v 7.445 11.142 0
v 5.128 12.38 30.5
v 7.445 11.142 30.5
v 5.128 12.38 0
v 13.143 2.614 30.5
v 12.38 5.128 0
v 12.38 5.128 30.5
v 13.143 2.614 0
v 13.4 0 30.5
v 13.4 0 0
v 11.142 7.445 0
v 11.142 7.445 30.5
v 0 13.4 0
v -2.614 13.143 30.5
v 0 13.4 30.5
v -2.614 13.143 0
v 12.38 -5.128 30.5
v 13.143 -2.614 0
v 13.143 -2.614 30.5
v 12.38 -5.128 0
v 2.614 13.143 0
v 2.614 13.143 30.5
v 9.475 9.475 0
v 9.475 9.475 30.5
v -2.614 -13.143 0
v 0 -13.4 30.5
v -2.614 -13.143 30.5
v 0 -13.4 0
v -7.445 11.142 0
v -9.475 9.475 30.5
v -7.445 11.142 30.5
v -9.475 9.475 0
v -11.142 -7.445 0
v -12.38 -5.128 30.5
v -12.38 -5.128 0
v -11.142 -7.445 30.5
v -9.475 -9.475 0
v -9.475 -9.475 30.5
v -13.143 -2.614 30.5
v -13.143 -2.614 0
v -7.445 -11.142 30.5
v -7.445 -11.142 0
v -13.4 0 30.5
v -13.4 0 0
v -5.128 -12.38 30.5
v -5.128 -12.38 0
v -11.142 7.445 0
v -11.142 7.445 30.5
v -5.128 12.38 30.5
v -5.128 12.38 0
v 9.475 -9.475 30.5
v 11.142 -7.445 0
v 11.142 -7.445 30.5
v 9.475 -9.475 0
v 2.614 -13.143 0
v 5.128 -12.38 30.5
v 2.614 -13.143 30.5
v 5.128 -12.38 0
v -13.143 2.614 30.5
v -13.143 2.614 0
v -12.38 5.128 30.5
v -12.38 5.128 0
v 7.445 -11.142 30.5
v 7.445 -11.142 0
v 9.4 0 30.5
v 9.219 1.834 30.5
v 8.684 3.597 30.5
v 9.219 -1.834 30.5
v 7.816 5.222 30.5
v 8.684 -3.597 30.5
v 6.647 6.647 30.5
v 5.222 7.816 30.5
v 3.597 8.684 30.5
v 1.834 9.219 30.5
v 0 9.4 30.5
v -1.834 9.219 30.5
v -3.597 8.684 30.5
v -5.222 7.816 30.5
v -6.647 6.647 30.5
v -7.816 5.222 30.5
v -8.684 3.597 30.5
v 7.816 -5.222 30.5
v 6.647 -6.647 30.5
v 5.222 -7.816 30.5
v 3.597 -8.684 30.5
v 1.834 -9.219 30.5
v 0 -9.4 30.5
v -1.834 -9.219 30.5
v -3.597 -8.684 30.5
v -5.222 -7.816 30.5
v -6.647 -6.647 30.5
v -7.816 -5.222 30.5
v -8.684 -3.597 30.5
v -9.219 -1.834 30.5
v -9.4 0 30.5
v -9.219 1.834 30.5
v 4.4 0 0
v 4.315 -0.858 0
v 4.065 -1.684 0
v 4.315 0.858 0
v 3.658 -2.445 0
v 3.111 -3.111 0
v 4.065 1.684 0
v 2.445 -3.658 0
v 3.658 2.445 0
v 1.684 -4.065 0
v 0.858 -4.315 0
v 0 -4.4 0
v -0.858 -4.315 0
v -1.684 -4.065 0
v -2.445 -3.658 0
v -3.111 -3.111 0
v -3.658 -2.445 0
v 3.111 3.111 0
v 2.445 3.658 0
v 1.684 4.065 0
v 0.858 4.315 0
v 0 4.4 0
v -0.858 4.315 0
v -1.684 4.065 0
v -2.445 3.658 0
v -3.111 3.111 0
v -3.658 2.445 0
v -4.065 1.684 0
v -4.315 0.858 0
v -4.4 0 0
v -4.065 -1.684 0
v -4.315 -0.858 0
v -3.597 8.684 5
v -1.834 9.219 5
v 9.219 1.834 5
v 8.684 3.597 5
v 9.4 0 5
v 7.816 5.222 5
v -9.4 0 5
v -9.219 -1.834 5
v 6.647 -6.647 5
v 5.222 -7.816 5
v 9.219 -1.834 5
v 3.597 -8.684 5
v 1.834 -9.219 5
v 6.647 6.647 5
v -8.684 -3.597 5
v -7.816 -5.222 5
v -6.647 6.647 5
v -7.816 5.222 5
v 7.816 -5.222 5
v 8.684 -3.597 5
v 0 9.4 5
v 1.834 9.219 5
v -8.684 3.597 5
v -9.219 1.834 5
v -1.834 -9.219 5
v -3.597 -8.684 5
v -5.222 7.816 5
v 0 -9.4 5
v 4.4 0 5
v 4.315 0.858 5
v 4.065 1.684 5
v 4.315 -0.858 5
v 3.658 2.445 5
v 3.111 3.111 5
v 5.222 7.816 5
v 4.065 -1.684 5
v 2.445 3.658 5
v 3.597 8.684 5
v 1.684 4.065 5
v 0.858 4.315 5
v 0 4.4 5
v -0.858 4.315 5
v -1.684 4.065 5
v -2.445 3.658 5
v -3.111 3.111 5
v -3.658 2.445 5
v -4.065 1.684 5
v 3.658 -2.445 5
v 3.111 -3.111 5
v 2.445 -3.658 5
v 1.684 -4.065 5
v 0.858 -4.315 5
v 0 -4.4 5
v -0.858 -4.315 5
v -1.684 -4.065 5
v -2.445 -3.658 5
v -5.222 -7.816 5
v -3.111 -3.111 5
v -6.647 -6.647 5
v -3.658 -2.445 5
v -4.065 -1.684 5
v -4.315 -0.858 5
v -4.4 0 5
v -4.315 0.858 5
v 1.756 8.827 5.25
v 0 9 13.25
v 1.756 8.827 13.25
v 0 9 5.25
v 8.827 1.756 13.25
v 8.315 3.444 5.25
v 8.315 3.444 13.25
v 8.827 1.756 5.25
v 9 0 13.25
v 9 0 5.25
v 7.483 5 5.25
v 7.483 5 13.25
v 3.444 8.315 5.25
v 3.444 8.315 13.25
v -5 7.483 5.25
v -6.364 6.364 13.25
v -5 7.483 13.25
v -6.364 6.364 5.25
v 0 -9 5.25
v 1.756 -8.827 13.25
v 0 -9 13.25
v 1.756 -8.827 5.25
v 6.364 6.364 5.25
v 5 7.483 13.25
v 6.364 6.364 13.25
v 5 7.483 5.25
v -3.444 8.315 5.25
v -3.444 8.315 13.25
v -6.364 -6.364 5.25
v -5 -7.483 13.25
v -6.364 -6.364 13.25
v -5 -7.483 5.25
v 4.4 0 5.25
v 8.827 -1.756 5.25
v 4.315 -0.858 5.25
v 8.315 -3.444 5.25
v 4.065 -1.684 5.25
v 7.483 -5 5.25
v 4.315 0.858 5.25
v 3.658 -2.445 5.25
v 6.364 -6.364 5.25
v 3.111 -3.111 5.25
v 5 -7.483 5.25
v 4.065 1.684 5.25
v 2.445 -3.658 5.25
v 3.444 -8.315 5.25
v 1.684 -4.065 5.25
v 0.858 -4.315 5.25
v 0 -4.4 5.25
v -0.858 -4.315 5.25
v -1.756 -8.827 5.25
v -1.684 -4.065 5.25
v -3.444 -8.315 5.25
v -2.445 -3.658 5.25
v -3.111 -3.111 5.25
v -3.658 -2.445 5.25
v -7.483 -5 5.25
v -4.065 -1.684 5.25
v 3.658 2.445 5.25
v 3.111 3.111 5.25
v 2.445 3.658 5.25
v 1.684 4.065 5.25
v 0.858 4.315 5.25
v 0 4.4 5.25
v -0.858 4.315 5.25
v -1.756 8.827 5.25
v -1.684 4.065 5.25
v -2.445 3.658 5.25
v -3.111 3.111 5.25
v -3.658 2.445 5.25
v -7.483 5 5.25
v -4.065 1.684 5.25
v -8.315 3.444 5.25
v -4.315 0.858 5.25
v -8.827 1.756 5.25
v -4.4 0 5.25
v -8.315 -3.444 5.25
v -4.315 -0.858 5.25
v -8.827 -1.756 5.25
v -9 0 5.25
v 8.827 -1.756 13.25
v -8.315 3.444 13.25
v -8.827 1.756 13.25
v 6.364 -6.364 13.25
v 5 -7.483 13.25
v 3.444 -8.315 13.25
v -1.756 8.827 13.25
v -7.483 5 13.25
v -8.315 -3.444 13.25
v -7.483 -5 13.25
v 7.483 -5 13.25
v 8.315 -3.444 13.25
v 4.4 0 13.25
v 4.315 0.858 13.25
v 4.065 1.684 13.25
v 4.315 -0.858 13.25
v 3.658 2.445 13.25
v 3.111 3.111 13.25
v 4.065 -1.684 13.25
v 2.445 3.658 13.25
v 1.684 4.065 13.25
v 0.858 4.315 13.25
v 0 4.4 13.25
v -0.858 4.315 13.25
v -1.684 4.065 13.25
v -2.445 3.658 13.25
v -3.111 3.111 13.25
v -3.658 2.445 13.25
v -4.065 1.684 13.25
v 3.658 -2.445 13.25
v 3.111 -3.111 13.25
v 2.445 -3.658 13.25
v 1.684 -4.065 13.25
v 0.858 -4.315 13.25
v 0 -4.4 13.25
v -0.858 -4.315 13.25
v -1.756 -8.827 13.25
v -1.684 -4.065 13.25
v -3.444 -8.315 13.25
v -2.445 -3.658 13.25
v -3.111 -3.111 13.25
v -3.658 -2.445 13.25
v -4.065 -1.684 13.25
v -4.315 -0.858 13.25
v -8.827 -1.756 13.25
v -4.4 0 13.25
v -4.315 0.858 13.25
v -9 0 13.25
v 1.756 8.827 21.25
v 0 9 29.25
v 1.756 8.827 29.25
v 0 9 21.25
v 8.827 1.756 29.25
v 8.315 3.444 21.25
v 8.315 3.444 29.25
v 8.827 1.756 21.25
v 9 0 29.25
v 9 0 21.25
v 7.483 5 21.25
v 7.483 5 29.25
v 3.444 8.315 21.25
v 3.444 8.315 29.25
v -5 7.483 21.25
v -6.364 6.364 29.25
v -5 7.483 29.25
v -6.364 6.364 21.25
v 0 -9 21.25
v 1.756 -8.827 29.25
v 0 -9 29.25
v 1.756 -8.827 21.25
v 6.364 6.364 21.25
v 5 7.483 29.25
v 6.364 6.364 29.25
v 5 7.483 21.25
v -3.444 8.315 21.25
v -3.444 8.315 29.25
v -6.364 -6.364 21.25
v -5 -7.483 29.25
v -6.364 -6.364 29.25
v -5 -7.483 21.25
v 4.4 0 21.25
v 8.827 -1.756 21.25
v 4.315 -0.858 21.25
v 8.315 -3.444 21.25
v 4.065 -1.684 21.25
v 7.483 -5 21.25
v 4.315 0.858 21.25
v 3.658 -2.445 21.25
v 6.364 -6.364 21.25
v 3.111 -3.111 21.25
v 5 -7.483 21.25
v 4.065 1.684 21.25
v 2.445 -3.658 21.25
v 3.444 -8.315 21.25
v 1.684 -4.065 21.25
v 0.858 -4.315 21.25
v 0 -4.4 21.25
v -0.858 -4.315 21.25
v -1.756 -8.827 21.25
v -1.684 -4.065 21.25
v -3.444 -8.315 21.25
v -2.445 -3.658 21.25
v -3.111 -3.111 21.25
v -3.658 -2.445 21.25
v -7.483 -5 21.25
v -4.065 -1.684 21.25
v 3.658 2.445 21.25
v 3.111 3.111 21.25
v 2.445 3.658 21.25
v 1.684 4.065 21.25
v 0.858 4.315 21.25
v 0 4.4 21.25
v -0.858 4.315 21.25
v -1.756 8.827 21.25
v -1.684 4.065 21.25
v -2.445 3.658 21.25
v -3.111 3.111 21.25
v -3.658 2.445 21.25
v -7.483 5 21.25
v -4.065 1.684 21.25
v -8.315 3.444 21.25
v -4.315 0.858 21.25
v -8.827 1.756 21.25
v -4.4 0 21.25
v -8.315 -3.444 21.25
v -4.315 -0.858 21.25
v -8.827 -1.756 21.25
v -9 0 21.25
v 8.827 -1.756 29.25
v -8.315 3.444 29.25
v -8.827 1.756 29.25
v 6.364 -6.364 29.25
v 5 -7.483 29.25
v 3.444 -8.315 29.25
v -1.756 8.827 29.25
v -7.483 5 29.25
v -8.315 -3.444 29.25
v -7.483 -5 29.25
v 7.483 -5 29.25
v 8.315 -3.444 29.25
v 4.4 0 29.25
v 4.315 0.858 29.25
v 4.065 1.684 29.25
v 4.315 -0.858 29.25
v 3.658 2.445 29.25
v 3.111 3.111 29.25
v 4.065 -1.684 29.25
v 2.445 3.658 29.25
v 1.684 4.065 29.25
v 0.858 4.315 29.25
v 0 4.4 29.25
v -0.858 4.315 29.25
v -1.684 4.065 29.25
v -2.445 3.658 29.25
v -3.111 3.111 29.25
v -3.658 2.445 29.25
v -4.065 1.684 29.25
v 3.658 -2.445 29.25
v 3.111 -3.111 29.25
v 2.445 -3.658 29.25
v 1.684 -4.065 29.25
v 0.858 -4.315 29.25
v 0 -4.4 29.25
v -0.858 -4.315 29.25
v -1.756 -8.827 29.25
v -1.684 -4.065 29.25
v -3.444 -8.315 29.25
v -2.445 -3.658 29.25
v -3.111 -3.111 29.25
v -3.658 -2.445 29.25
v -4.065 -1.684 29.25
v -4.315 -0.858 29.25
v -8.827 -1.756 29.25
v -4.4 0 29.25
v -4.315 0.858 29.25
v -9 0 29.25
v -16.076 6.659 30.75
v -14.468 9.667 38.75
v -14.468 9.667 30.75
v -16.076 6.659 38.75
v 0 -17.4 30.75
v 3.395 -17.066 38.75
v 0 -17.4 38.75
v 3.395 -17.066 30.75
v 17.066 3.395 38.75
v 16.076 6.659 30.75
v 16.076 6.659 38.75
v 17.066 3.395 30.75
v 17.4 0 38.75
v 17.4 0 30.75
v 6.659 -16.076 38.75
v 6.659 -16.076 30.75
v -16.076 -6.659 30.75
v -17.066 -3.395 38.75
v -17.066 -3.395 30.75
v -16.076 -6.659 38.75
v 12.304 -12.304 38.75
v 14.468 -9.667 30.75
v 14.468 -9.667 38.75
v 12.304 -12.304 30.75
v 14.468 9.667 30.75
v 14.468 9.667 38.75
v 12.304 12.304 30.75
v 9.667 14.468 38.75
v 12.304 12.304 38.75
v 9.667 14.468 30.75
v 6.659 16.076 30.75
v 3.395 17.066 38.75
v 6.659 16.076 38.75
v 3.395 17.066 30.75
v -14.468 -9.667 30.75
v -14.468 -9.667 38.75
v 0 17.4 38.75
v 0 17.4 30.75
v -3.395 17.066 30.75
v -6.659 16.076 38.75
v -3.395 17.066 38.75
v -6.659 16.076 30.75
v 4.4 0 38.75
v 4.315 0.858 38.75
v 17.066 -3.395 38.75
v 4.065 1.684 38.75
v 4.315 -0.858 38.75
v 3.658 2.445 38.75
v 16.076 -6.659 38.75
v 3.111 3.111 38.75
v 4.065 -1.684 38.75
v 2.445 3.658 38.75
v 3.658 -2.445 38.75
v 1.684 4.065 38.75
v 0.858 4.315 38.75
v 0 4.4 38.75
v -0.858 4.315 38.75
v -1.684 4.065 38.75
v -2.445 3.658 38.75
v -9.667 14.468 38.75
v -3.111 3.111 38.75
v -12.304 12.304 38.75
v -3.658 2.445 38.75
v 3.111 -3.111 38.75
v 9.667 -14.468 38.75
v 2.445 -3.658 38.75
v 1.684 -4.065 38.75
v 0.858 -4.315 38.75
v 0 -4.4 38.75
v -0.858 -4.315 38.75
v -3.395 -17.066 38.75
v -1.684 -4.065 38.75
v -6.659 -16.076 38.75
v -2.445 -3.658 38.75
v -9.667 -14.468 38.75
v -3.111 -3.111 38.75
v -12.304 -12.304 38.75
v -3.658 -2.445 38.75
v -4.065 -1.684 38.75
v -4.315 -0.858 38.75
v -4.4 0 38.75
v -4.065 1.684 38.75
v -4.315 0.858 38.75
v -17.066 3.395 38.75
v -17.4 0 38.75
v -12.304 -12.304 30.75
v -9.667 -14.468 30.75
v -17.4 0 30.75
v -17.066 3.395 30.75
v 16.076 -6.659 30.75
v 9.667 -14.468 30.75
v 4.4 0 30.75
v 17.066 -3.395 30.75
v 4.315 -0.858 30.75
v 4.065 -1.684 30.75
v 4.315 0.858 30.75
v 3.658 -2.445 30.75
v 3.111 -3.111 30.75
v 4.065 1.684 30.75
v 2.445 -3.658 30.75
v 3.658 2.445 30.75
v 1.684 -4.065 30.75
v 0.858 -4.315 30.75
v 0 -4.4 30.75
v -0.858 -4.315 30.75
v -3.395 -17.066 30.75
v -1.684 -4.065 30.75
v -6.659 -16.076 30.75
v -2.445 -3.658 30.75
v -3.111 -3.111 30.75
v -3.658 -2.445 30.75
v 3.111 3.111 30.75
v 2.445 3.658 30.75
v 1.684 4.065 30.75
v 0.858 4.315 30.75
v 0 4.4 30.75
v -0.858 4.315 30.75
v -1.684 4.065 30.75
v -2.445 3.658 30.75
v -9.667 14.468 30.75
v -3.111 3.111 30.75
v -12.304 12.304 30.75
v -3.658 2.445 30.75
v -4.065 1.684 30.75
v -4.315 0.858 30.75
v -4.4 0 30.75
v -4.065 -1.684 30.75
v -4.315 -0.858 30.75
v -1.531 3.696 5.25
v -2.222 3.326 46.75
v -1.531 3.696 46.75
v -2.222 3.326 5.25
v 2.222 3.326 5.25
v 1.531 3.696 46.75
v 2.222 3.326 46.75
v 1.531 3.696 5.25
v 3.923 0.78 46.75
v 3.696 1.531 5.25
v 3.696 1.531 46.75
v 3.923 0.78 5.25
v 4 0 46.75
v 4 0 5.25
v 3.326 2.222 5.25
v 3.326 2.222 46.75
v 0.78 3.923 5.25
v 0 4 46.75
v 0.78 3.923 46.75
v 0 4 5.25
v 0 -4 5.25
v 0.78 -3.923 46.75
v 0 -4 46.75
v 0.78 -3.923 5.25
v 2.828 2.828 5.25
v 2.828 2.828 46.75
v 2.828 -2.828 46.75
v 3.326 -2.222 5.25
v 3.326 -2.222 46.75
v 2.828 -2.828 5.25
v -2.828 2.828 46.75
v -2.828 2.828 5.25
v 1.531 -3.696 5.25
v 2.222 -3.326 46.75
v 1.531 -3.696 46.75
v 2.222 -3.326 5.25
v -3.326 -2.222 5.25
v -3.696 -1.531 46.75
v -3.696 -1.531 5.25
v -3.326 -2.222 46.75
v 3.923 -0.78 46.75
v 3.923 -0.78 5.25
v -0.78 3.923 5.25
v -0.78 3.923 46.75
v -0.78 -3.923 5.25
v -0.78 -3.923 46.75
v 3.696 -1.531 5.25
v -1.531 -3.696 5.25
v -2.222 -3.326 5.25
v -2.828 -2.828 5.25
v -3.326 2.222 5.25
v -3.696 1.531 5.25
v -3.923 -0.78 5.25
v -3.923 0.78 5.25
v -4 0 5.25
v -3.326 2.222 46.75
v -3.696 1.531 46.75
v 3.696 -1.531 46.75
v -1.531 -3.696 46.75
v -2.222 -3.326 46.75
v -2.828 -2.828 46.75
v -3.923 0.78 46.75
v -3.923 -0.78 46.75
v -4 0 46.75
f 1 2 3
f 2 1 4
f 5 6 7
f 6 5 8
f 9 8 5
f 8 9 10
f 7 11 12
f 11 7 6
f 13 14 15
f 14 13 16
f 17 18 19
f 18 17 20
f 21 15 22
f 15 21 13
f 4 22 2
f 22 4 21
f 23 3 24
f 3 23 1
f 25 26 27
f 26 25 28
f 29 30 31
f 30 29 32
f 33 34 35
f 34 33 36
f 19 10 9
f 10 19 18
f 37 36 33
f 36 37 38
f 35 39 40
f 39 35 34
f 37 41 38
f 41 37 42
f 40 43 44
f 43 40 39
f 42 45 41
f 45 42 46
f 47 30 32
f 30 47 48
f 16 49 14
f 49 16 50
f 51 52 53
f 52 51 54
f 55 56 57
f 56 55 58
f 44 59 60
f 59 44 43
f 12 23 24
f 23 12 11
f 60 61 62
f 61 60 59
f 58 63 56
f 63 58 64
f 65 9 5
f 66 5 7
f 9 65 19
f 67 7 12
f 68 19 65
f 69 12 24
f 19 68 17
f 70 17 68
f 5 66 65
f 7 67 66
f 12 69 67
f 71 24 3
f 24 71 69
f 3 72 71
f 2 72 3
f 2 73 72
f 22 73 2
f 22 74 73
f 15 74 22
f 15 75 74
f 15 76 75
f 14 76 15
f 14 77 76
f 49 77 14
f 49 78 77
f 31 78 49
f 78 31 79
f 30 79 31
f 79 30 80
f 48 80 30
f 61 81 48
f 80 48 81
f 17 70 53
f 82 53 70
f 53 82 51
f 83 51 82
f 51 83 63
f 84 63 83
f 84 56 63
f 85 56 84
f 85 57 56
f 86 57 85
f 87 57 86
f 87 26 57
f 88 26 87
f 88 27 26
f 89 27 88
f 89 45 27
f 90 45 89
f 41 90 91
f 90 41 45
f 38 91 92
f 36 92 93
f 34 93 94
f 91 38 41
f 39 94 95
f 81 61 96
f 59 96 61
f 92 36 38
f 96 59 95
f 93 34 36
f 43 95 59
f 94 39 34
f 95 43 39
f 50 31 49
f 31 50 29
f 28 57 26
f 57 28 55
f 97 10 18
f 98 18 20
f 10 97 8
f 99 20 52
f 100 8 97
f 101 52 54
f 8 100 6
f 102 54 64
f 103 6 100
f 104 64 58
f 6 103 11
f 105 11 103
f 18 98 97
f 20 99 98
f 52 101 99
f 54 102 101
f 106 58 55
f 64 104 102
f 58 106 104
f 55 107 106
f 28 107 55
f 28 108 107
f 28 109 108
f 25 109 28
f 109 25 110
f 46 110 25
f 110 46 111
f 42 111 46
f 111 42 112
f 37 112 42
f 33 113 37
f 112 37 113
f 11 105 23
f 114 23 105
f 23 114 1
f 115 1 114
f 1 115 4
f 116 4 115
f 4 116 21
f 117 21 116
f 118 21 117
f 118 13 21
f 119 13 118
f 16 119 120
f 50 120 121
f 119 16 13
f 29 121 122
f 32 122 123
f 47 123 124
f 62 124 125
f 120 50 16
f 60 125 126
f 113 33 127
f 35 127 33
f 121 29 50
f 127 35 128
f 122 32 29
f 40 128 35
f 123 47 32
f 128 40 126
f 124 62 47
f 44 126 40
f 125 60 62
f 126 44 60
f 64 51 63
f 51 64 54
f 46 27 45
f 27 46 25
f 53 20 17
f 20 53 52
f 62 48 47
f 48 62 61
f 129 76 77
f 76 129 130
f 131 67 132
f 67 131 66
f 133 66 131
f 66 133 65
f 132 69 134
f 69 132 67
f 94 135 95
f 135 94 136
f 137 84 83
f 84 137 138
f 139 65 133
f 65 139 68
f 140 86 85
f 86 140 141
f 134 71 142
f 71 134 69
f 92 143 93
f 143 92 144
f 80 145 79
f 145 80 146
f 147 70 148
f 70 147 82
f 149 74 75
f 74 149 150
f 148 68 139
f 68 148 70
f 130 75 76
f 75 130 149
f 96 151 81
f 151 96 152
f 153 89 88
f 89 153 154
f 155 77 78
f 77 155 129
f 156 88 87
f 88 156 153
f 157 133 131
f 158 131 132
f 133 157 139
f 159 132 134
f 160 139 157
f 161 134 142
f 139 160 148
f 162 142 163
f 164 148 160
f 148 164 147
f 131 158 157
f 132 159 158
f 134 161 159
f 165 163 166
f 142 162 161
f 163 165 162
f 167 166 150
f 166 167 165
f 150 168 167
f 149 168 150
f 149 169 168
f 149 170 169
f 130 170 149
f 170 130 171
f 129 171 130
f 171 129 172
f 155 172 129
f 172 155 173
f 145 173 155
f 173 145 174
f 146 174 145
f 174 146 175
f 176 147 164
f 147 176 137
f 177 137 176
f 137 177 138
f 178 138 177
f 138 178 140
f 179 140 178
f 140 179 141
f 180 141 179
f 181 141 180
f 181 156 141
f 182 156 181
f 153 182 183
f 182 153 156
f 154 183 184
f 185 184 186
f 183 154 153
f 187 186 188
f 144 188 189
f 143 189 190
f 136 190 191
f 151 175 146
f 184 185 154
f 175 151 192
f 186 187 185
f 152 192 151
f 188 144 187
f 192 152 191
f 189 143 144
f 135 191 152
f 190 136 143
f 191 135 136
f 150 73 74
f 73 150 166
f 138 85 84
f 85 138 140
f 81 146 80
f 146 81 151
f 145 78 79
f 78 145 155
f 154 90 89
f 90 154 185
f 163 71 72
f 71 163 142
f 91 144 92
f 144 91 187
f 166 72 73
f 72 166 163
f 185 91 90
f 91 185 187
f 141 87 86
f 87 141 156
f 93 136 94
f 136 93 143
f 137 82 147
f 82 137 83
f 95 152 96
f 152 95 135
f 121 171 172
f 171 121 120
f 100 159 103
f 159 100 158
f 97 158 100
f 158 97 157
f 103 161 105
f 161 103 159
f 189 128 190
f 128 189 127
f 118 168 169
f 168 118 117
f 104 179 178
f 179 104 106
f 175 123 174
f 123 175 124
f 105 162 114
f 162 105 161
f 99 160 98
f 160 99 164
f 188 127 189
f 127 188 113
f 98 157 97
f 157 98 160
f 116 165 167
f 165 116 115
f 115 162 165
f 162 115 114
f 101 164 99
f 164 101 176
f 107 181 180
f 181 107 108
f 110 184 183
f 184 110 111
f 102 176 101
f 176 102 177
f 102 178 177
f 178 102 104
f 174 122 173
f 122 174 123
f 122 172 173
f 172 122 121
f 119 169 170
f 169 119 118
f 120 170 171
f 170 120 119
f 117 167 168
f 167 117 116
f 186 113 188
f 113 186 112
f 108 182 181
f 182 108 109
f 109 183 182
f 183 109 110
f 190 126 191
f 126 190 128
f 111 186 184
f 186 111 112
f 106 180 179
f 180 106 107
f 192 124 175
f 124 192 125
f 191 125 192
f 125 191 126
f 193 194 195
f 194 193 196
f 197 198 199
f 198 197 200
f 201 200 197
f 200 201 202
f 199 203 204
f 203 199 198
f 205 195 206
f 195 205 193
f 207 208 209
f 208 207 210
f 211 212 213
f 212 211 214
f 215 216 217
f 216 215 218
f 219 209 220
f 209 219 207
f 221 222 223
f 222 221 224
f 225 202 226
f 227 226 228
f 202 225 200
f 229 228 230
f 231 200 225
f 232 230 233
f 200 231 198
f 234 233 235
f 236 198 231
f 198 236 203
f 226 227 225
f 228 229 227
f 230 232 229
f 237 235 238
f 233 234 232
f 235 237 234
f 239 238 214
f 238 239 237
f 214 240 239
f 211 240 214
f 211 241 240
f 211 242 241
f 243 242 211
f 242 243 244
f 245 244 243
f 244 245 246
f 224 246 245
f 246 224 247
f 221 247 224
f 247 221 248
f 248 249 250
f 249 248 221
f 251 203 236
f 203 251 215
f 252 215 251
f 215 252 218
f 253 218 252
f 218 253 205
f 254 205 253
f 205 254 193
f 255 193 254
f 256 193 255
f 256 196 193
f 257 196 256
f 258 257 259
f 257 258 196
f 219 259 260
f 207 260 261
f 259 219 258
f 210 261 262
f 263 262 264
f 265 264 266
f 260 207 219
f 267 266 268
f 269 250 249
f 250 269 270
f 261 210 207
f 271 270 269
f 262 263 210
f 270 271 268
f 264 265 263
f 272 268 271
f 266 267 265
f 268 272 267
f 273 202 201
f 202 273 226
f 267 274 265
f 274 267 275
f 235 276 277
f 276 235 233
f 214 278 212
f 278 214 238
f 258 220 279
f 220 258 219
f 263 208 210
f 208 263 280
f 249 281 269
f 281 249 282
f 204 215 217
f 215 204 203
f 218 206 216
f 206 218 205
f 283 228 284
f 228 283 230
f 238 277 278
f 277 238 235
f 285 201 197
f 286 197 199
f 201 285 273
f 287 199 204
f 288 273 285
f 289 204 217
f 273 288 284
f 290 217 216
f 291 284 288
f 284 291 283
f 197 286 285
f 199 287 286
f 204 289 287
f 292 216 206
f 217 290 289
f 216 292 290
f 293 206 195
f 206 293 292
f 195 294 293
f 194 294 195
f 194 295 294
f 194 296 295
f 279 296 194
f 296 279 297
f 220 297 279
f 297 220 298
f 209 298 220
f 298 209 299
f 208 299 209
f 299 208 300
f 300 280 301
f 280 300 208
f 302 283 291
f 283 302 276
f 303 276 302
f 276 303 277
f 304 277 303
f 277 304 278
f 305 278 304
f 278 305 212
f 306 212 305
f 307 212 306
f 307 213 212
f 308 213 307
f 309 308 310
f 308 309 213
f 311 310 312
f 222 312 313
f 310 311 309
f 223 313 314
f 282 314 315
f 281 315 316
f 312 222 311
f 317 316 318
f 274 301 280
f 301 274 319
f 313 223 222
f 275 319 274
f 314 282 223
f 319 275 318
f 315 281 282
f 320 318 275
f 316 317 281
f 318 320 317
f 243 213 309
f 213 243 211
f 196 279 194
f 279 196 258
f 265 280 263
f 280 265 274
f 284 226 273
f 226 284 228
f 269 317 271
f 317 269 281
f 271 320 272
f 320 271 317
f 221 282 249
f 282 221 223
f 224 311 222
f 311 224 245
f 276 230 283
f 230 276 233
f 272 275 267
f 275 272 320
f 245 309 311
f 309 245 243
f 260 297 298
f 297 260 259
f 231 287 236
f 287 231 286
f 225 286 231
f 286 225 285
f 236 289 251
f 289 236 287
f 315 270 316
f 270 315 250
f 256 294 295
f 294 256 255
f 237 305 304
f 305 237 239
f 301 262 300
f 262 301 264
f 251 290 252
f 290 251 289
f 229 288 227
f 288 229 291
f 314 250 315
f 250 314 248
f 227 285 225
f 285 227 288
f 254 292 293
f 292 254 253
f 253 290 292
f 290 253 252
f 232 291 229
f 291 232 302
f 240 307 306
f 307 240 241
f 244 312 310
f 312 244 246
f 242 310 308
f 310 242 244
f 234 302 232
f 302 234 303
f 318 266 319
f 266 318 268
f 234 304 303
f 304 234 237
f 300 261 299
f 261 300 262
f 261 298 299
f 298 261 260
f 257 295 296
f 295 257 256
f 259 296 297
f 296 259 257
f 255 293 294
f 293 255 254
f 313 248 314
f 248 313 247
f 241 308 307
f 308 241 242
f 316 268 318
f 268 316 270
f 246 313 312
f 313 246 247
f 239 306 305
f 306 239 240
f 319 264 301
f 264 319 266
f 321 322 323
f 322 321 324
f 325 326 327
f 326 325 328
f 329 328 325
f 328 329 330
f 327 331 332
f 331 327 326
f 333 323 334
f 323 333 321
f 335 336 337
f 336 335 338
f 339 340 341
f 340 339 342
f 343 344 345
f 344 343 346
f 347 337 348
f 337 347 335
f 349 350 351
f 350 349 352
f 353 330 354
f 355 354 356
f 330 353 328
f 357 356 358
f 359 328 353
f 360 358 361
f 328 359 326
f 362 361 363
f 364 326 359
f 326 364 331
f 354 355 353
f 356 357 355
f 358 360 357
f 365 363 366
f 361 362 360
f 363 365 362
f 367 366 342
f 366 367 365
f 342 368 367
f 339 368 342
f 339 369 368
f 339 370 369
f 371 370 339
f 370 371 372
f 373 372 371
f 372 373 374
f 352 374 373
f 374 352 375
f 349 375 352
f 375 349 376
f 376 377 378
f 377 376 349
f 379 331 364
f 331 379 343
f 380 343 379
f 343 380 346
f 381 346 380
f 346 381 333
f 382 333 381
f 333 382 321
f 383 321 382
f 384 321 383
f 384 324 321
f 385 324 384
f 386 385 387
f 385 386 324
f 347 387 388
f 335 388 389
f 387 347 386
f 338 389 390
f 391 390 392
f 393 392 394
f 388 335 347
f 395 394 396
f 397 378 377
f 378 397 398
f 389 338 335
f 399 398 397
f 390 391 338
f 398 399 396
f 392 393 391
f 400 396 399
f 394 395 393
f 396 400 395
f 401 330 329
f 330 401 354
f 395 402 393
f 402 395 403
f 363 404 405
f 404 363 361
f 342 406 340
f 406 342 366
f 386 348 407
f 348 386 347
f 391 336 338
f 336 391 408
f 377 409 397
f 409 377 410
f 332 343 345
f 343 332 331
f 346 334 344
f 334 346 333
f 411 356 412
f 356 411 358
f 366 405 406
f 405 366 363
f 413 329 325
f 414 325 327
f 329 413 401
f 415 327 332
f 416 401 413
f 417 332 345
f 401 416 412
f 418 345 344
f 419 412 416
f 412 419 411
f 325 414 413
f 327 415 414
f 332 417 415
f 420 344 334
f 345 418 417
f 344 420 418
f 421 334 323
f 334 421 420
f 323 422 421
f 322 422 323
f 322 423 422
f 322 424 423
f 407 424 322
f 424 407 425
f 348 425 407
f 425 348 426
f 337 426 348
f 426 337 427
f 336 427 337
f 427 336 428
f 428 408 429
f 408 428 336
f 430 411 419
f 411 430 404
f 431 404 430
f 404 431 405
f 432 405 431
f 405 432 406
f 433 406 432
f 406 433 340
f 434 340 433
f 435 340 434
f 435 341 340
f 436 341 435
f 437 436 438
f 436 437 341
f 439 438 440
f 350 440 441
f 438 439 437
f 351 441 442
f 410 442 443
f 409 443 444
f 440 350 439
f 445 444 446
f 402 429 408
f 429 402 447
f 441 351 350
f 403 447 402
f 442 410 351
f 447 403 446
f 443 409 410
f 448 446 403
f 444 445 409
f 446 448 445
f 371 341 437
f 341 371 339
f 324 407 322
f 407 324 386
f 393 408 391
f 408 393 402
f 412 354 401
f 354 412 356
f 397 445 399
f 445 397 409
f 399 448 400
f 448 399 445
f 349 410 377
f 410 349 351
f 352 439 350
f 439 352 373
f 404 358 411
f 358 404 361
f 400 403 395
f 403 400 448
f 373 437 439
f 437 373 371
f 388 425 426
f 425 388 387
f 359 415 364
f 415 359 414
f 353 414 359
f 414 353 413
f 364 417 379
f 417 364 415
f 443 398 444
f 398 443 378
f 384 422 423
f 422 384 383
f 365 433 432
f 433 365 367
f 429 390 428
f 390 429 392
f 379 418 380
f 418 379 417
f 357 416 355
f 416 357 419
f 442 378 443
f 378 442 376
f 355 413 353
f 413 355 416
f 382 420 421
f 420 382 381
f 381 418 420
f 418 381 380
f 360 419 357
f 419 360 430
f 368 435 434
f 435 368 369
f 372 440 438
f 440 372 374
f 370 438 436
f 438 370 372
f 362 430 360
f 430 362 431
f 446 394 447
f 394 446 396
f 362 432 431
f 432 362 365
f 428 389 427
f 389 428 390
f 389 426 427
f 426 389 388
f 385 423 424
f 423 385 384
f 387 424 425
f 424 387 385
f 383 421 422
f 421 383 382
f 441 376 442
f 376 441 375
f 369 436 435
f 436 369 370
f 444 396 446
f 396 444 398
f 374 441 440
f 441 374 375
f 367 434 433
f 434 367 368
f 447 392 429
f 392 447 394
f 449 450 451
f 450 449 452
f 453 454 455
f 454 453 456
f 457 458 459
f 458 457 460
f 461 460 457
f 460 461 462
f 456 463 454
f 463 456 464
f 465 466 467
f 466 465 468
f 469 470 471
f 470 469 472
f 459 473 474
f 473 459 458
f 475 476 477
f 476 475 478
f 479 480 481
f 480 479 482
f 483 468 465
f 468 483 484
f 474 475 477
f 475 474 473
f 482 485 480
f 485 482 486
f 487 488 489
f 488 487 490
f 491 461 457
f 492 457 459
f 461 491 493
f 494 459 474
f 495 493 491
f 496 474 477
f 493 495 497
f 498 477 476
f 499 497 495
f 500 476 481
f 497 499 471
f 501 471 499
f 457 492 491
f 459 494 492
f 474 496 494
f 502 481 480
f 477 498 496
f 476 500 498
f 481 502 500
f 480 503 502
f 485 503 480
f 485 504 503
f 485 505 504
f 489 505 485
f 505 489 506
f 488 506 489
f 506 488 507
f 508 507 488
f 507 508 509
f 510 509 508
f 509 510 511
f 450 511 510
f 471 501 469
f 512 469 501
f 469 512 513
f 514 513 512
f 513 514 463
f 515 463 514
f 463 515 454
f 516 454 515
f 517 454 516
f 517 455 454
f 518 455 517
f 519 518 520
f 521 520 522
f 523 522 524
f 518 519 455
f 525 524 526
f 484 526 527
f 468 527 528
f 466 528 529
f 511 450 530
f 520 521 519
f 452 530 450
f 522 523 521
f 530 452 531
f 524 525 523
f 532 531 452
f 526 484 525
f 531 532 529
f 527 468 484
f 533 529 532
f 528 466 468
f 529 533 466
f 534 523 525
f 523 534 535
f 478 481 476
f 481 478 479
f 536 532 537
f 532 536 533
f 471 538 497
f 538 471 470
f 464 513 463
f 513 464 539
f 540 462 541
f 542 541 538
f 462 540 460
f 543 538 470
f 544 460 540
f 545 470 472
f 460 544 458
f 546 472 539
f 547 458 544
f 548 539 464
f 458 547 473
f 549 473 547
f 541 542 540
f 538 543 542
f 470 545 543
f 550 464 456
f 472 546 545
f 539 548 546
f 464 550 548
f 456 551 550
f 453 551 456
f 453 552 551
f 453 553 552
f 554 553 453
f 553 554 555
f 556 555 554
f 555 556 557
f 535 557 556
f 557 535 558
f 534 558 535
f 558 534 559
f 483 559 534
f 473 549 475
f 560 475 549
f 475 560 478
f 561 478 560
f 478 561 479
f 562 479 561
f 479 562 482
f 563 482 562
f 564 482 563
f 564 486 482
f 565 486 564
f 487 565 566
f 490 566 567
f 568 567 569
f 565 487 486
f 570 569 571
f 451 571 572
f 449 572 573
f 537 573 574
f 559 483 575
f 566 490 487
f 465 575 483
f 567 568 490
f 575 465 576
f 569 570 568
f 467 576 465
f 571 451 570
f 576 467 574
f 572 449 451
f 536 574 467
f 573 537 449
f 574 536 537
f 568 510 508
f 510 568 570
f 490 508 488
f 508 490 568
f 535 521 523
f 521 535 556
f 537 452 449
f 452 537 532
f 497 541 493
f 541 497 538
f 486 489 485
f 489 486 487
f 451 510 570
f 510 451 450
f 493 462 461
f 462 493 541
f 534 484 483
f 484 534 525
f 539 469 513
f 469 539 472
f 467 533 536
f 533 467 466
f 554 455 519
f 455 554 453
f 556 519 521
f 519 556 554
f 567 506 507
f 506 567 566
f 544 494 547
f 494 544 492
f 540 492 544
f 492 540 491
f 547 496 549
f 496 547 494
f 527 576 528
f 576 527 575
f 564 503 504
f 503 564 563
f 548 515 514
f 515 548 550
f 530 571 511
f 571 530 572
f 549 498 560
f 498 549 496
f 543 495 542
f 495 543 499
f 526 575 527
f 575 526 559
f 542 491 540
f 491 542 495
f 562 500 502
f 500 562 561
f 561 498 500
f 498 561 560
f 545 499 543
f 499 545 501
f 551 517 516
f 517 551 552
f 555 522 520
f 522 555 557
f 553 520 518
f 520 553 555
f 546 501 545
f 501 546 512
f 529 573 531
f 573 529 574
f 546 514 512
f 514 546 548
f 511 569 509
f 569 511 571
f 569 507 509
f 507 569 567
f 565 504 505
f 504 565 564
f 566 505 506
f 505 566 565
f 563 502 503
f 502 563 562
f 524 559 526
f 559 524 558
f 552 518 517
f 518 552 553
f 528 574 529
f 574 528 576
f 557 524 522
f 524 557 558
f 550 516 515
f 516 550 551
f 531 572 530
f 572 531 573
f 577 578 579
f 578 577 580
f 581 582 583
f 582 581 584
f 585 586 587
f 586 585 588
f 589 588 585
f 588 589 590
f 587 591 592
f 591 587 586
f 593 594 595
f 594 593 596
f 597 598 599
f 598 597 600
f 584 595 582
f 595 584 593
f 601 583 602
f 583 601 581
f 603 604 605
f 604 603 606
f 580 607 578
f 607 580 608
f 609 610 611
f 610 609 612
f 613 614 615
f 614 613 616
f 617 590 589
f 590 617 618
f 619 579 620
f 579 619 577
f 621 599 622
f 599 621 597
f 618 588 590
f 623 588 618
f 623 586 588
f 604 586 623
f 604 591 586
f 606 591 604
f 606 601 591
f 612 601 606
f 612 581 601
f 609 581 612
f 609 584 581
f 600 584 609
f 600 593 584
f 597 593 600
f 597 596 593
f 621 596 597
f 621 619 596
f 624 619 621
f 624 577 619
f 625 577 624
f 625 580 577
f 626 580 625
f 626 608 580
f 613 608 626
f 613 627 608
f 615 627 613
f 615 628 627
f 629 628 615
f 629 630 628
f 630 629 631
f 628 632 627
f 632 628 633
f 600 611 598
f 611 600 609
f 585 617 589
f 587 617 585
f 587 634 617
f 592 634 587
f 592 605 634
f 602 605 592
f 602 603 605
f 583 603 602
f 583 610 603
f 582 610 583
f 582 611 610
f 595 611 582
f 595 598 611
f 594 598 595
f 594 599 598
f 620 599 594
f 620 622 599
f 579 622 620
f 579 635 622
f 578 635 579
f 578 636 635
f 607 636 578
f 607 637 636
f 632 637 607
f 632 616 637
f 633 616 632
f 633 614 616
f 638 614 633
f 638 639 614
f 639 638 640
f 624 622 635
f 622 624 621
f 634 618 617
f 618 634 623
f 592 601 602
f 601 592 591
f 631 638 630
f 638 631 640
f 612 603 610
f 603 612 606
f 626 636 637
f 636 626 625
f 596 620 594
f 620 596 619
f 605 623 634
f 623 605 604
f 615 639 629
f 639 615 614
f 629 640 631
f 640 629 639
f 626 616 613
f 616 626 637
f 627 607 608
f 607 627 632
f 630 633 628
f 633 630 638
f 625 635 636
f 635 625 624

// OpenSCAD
$fn = 32;

// ------------------------------------------------------------------------
// Shaft station: cup d26.8 x 30.5 mm, shaft d8
// Every part is its own module, assembly() places every instance.
// ------------------------------------------------------------------------

// --- part 1 ---
module housing_cup() {
  difference() {
    cylinder(h = 30.5, d = 26.8);
    translate([0, 0, 5]) cylinder(h = 26.5, d = 18.8);
    translate([0, 0, -1]) cylinder(h = 7, d = 8.8);
  }
}

// --- part 2 ---
module bearing_lower() {
  difference() {
      translate([0, 0, 0]) cylinder(h = 8, d = 18);
      translate([0, 0, -1]) cylinder(h = 10, d = 8.8);
    }
}

// --- part 3 ---
module bearing_upper() {
  difference() {
      translate([0, 0, 0]) cylinder(h = 8, d = 18);
      translate([0, 0, -1]) cylinder(h = 10, d = 8.8);
    }
}

// --- part 4 ---
module station_shaft() {
  translate([0, 0, -20.75]) cylinder(h = 41.5, d = 8);
}

// --- part 5 ---
module station_cover() {
  difference() {
    cylinder(h = 8, d = 34.8);
    translate([0, 0, -1]) cylinder(h = 10, d = 8.8);
  }
}

// --- assembly ---
module assembly() {
  color([0.80, 0.24, 0.20]) translate([0, 0, 0]) rotate([0, 0, 0]) housing_cup();
  color([0.20, 0.45, 0.75]) translate([0, 0, 5.25]) rotate([0, 0, 0]) bearing_lower();
  color([0.25, 0.62, 0.32]) translate([0, 0, 21.25]) rotate([0, 0, 0]) bearing_upper();
  color([0.92, 0.70, 0.18]) translate([0, 0, 26]) rotate([0, 0, 0]) station_shaft();
  color([0.58, 0.35, 0.70]) translate([0, 0, 30.75]) rotate([0, 0, 0]) station_cover();
}

assembly();
